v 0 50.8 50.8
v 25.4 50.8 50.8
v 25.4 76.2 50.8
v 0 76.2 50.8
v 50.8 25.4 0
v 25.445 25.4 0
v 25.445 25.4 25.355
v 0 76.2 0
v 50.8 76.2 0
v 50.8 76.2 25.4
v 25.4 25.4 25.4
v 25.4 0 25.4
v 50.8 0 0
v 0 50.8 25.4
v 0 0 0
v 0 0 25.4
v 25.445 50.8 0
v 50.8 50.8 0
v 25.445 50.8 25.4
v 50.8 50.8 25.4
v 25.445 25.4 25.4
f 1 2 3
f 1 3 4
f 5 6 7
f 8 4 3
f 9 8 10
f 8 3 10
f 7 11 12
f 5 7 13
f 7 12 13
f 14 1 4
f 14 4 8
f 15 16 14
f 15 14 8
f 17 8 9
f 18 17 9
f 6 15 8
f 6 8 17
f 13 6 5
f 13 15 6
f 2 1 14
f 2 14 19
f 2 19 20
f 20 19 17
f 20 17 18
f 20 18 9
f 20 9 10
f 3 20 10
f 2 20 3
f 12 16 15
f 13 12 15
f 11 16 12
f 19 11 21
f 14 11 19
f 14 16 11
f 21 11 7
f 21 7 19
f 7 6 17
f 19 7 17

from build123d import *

# Parameters (mm, degrees)
F2_DEPTH = 76.2
F3_DEPTH = 50.8
F4_W     = 25.355122
F4_H     = 25.4
F5_DEPTH = 25.4
F7_DEPTH = 25.4


with BuildPart() as f2:
    # F0 (on Front) → F2 (new body)
    with BuildSketch(Plane.XZ):
        Polygon((0, 25.4), (0, 0), (50.8, 0), (50.8, 25.4), (25.4, 50.8), (0, 50.8), align=None)
    extrude(amount=-F2_DEPTH)

    # F1 (on Right) → F3 (cut)
    with BuildSketch(Plane.YZ):
        Polygon((50.8, 25.4), (50.8, 50.8), (0, 50.8), (0, 25.4), (25.4, 25.4), align=None)
    extrude(amount=F3_DEPTH, mode=Mode.SUBTRACT)

    # F4 (on Top) → F5 (cut)
    with BuildSketch(Plane.XY):
        with Locations((38.122439, 38.1)):
            Rectangle(F4_W, F4_H)
    extrude(amount=F5_DEPTH, mode=Mode.SUBTRACT)

    # F6 (on face) → F7 (cut)
    with BuildSketch(Plane.XZ):
        Polygon((25.4, 25.4), (50.8, 0), (50.8, 25.4), align=None)
    extrude(amount=-F7_DEPTH, mode=Mode.SUBTRACT)


solid = f2.part
